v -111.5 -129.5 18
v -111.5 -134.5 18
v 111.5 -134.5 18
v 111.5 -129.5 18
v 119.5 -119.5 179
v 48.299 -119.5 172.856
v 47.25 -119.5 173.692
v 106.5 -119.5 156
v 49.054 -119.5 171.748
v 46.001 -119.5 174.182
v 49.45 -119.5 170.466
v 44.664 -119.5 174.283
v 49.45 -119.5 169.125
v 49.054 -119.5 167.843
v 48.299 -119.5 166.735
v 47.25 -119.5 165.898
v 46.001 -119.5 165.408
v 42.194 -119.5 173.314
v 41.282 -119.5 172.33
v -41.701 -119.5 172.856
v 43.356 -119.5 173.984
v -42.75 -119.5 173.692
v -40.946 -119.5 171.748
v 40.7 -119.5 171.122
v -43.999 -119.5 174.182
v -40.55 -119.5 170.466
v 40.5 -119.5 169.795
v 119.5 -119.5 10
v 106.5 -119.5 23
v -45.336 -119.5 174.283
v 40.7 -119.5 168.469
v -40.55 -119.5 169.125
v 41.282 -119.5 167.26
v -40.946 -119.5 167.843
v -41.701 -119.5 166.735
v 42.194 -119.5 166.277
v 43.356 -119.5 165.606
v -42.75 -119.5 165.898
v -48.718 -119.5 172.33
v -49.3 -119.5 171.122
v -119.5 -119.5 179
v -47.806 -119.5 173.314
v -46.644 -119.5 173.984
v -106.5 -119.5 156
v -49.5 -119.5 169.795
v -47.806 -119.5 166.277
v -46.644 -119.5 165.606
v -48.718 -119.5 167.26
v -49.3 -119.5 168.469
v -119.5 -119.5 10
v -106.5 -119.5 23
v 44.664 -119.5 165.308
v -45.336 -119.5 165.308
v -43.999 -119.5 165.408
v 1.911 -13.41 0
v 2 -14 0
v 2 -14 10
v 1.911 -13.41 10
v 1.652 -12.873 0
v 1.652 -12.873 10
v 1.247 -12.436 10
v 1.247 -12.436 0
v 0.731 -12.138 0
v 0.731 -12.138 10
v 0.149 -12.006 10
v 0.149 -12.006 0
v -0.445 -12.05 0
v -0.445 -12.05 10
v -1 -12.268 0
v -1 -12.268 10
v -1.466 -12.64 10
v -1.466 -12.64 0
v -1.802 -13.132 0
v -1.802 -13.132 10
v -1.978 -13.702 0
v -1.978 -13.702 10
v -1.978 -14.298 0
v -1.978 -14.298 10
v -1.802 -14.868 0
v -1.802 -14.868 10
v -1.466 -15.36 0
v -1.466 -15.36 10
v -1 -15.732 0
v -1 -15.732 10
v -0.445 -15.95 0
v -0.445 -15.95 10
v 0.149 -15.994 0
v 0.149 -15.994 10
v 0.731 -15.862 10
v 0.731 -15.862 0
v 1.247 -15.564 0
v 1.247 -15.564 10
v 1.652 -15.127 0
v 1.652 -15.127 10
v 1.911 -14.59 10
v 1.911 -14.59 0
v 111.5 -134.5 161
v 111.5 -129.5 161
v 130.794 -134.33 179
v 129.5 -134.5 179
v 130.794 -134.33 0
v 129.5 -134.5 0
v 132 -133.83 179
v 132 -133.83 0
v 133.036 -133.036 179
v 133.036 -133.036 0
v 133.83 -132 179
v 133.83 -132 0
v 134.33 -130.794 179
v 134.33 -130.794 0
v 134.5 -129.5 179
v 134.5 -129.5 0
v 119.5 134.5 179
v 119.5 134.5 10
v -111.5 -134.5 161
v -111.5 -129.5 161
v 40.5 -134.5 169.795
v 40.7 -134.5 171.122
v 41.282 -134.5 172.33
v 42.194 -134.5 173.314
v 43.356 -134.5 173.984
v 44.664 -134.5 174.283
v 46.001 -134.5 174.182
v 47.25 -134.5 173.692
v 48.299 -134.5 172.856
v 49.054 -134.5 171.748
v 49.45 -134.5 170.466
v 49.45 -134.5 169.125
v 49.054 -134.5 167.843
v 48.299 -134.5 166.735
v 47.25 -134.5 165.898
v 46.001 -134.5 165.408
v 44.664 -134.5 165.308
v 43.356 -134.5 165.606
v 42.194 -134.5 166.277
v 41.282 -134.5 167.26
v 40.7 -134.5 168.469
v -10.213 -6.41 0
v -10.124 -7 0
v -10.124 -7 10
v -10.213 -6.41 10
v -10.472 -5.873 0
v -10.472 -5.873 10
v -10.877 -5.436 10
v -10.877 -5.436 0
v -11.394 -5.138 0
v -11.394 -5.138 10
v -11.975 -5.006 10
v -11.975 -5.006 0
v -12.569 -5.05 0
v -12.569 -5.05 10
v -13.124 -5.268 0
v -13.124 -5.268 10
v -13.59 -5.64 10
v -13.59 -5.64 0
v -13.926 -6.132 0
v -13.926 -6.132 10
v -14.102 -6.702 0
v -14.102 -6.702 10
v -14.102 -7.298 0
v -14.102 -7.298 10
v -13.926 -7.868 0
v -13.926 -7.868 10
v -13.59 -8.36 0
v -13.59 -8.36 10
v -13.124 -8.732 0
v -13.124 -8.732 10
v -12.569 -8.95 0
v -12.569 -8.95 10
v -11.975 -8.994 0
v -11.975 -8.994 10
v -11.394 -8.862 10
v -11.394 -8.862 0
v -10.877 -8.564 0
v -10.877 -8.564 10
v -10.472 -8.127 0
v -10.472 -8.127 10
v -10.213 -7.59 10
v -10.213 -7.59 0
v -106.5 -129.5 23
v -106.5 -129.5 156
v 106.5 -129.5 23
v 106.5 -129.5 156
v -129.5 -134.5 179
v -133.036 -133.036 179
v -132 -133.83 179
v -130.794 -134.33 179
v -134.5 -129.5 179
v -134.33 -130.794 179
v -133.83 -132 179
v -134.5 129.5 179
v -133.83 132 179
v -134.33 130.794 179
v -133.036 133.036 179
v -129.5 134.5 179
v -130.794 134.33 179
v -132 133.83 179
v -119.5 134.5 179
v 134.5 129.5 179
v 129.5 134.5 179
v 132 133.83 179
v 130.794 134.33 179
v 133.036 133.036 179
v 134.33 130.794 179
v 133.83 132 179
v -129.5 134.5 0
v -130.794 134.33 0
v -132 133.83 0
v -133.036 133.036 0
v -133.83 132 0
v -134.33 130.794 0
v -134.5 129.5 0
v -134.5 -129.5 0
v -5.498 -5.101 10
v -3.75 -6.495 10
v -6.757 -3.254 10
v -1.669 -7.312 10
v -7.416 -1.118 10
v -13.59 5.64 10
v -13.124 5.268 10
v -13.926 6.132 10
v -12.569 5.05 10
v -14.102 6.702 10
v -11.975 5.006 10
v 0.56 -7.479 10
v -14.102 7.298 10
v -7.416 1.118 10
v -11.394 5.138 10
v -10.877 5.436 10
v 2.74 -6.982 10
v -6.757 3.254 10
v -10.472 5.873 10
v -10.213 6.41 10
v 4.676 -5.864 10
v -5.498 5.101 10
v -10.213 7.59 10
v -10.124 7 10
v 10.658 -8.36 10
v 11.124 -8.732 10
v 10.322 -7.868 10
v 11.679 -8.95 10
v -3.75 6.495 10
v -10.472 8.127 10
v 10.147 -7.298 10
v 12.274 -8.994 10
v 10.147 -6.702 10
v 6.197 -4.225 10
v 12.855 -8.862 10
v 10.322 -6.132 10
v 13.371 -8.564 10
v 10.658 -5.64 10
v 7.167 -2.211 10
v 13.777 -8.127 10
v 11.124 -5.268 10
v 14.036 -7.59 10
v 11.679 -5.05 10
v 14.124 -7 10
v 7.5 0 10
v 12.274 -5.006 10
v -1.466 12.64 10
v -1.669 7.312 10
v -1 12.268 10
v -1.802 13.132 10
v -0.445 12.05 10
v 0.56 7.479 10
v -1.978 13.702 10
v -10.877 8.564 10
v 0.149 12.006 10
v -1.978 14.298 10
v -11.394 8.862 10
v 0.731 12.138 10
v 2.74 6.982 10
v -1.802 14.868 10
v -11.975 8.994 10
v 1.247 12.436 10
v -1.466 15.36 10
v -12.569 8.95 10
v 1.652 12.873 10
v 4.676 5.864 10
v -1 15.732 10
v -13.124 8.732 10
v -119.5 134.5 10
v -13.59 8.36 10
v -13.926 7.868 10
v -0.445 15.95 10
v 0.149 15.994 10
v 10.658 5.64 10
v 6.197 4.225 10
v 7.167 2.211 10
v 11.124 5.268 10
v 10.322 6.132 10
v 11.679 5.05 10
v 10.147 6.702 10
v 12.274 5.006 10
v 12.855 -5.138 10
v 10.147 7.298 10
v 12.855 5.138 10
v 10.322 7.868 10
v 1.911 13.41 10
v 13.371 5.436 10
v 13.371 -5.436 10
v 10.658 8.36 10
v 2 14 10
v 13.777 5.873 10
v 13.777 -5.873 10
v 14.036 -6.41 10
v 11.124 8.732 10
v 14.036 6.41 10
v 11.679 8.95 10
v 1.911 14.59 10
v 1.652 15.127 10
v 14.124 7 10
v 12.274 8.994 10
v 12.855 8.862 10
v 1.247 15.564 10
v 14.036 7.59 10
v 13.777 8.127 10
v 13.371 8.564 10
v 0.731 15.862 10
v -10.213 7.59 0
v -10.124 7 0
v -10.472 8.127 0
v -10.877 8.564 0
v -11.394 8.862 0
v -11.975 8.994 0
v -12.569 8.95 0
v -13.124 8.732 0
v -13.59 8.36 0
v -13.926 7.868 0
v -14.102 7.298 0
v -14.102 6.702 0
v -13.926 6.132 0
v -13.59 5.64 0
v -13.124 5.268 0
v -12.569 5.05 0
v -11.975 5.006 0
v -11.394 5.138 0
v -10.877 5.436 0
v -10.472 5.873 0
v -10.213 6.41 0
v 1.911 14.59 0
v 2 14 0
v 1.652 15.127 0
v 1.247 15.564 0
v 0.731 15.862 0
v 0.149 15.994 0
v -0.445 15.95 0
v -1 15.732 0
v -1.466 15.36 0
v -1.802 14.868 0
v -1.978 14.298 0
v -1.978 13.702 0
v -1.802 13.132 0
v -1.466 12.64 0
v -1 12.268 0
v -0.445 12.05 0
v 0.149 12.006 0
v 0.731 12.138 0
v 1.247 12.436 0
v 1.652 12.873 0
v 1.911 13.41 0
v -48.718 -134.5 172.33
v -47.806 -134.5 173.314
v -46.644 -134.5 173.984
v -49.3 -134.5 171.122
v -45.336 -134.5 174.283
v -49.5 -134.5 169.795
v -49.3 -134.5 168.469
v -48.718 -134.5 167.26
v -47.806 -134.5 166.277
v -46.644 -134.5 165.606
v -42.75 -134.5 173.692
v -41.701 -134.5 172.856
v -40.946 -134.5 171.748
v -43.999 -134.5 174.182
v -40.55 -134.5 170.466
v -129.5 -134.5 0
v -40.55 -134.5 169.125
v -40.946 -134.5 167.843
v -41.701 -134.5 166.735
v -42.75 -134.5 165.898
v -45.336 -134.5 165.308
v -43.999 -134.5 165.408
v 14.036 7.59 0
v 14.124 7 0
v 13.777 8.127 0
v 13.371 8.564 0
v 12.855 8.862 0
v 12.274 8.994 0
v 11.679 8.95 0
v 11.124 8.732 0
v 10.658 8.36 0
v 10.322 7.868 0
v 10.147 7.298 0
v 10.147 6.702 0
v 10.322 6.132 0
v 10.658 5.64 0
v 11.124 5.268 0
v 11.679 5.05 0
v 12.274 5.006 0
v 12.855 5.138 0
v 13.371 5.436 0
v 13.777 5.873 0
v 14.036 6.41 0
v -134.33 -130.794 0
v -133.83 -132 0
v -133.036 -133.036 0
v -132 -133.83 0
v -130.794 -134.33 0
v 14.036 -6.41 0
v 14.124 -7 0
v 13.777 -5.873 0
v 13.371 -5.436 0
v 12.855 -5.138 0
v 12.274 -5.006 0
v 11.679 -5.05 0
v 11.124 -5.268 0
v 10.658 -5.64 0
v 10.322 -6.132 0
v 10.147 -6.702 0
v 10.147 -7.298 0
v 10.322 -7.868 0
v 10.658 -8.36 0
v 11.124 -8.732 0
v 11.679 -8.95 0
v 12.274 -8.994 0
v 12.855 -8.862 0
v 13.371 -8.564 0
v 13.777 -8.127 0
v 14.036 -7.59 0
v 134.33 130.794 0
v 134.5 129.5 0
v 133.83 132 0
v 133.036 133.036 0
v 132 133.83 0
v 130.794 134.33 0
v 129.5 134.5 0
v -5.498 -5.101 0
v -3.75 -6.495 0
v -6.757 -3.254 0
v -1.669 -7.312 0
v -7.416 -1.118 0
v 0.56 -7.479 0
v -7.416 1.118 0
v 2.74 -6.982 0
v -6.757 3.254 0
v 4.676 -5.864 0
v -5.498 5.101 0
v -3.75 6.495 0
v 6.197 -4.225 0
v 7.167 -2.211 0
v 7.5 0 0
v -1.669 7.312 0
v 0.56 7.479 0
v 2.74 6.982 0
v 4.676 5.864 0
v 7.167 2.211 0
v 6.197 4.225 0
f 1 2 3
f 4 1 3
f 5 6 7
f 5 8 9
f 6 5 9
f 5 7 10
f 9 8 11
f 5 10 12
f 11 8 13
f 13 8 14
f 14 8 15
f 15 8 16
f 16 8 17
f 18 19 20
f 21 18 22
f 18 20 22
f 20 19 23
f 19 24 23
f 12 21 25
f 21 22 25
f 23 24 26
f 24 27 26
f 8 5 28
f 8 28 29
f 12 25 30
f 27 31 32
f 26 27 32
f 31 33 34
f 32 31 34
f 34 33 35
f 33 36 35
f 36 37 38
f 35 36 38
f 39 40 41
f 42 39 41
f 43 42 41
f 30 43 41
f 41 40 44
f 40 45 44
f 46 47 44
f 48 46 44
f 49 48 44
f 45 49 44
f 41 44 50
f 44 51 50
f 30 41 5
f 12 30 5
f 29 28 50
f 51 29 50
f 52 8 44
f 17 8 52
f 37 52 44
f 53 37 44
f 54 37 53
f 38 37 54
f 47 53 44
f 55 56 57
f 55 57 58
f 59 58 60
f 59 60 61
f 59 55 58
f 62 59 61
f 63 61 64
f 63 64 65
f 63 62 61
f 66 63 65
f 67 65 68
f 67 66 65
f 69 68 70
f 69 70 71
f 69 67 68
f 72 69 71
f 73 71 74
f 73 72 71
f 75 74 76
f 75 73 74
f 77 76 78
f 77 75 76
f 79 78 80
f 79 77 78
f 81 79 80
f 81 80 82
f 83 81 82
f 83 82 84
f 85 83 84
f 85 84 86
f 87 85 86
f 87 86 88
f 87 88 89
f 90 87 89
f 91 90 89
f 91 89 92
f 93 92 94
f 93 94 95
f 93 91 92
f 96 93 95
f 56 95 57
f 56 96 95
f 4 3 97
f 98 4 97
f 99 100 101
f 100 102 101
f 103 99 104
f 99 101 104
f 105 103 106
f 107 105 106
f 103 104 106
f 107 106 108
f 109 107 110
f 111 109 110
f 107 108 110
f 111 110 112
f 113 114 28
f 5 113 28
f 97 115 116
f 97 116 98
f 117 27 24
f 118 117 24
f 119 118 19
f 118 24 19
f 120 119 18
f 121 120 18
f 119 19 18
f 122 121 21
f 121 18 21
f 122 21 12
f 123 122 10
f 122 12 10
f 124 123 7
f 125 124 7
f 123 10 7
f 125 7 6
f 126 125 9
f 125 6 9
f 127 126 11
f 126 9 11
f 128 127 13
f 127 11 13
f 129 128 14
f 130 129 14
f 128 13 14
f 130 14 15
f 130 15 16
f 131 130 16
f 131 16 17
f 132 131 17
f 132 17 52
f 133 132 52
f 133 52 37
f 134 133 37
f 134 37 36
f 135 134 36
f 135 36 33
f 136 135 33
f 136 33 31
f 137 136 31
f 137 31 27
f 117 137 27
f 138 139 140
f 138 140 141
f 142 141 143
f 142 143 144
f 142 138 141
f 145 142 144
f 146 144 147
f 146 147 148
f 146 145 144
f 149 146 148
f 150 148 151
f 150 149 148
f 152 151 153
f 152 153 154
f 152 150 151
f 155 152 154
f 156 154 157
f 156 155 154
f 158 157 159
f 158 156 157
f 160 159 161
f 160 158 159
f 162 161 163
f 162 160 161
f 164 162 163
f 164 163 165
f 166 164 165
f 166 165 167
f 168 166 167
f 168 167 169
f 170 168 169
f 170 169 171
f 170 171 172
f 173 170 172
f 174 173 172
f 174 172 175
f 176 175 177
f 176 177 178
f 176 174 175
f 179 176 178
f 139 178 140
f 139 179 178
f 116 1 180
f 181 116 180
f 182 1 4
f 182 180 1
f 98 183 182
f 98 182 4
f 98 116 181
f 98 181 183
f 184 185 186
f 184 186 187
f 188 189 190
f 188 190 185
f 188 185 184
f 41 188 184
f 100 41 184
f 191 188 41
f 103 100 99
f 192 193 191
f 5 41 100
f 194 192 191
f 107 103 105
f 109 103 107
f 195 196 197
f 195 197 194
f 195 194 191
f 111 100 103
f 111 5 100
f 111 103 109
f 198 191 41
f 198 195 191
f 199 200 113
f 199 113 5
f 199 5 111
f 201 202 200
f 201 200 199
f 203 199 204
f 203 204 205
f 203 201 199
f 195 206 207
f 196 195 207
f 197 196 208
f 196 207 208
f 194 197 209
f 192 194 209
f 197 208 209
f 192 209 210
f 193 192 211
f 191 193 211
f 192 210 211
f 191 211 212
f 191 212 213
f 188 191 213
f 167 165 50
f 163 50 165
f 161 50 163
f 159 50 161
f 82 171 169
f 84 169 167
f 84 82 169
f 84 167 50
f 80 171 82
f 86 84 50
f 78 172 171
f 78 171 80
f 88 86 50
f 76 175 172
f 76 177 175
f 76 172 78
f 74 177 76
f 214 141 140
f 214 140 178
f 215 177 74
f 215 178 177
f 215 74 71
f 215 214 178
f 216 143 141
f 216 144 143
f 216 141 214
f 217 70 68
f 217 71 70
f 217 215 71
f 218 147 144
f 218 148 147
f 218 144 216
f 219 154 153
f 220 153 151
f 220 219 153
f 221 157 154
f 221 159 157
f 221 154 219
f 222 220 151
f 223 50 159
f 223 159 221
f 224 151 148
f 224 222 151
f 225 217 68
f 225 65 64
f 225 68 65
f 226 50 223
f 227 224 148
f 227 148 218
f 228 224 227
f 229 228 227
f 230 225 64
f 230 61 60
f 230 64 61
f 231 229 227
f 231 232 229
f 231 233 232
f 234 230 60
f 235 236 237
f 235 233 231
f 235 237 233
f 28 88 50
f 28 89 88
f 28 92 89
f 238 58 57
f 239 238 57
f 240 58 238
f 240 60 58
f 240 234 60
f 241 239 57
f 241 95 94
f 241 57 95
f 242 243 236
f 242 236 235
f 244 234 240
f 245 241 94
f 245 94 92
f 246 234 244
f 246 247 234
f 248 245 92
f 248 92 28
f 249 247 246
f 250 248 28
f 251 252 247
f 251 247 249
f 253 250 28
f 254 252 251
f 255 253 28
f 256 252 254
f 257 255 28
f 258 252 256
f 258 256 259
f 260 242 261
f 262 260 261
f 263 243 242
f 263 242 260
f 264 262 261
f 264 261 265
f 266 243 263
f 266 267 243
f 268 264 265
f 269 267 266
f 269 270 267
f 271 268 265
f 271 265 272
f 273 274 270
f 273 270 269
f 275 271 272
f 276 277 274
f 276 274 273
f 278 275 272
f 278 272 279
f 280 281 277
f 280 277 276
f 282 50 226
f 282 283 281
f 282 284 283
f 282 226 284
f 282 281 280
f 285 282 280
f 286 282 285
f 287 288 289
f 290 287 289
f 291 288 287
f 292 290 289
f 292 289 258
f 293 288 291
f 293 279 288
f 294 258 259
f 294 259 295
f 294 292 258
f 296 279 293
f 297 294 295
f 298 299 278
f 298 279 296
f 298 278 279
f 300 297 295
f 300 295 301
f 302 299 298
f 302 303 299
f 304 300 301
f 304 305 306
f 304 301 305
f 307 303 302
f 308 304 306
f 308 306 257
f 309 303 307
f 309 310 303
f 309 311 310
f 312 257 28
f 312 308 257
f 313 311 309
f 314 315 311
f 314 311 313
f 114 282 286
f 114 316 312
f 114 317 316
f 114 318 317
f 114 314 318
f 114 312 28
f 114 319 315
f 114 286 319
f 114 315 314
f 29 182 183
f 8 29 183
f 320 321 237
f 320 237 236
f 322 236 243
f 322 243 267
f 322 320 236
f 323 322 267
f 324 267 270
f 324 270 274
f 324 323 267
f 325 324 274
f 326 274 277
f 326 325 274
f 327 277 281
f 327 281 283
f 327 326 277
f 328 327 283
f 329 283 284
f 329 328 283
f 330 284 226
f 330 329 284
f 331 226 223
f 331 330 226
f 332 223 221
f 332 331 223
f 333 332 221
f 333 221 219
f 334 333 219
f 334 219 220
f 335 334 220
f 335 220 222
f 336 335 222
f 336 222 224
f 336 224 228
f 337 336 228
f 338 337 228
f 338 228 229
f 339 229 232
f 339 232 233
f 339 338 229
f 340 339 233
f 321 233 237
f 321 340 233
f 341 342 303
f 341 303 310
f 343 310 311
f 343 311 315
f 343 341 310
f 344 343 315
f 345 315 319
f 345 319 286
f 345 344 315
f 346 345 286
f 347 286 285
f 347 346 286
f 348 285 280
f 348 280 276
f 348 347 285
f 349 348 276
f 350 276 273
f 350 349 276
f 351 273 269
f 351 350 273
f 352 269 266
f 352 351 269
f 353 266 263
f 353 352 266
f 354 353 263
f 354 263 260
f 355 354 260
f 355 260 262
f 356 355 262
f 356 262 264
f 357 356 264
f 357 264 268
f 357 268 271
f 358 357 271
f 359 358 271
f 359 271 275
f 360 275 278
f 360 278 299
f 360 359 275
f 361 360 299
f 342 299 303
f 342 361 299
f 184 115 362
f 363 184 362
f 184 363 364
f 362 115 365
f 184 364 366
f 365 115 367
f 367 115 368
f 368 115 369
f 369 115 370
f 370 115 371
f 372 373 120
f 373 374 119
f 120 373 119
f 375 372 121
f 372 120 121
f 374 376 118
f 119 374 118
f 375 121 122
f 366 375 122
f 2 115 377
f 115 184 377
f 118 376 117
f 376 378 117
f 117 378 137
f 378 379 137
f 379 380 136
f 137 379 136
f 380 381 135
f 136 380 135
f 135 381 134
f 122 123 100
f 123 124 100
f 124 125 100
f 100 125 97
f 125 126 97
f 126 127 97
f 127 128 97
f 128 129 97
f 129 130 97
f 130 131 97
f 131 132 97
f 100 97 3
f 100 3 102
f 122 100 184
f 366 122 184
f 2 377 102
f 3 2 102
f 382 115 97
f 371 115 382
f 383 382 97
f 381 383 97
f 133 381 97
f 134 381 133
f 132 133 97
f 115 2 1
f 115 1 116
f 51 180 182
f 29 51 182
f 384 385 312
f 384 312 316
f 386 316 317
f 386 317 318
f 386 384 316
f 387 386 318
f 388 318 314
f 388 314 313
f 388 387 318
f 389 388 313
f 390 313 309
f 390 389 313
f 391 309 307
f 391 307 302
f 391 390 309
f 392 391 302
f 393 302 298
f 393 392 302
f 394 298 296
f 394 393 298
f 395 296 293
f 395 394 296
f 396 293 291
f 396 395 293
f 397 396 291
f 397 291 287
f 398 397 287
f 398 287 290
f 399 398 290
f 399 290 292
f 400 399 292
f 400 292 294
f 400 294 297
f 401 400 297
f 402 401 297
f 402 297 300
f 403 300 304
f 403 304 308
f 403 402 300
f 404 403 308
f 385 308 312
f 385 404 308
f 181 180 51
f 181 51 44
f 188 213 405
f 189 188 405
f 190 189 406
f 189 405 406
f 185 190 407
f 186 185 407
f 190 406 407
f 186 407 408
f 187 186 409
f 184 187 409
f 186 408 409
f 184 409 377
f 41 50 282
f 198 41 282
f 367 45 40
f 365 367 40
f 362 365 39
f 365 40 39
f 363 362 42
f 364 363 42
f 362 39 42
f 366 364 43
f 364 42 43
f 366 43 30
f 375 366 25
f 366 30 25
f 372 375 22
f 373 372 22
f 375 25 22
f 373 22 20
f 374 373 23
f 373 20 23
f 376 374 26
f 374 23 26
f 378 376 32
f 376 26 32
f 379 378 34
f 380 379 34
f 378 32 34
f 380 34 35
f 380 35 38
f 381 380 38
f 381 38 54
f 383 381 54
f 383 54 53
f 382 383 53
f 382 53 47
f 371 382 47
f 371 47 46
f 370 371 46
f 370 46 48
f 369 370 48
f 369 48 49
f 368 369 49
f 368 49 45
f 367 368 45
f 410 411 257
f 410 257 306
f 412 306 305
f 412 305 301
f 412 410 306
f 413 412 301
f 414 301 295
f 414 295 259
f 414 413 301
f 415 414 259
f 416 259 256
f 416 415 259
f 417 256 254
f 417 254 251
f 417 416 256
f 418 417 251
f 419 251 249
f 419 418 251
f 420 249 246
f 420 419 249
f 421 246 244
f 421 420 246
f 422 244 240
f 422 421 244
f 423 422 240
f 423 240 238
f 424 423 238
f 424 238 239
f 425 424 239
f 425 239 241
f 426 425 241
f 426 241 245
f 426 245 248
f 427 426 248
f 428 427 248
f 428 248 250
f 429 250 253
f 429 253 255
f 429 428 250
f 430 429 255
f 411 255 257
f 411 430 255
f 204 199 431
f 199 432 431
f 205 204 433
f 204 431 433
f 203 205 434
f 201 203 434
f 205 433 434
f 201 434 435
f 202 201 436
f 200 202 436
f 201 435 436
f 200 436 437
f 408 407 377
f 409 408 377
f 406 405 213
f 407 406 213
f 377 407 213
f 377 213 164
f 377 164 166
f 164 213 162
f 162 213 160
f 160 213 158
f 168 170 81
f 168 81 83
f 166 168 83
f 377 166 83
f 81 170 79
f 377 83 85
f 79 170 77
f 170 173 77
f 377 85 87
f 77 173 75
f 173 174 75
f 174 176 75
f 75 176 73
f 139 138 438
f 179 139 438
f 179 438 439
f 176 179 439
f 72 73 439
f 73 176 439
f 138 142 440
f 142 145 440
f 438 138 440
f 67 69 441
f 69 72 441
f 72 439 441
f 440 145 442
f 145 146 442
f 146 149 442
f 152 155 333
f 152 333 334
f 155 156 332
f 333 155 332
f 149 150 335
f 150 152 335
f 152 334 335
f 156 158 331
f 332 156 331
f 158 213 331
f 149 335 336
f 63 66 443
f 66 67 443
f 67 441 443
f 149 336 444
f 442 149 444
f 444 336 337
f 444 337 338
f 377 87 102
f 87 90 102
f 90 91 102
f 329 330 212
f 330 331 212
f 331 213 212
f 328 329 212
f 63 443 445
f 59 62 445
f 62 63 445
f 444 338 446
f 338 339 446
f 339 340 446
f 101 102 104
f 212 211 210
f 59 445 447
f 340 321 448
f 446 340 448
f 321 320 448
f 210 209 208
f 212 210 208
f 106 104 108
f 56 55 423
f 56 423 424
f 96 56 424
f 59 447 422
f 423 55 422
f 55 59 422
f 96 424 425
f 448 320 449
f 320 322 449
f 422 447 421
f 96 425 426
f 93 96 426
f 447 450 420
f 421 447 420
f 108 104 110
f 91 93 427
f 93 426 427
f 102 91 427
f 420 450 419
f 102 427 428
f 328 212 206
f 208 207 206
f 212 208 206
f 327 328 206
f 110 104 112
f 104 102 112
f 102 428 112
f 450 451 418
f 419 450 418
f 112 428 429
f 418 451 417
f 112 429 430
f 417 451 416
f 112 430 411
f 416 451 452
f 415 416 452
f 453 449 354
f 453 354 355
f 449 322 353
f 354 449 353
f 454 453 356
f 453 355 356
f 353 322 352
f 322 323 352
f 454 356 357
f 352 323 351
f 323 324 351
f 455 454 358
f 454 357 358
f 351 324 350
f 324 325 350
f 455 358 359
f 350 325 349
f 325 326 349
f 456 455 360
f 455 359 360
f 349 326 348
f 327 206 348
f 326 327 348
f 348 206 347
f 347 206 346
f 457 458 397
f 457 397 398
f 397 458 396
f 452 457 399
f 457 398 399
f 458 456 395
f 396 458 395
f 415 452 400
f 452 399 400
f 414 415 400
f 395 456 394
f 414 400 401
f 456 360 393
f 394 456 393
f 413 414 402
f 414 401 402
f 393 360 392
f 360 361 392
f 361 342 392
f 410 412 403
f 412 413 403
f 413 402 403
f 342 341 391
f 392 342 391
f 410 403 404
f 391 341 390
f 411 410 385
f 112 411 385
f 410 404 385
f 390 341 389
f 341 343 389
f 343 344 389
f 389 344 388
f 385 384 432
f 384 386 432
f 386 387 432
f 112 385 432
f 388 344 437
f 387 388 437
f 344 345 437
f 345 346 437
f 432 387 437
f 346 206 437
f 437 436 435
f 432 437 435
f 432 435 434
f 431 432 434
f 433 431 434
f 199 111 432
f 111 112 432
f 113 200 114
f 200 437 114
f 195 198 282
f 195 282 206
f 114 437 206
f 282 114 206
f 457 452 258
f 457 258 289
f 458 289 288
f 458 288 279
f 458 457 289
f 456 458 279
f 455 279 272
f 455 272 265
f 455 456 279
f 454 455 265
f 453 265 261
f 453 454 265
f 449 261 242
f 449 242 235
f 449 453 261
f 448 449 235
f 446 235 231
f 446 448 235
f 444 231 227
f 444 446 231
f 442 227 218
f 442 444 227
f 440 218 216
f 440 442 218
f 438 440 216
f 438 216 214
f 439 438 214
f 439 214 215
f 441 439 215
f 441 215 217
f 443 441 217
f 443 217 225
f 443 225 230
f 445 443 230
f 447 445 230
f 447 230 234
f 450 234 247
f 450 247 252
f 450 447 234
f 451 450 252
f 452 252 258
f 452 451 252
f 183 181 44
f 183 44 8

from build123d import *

# Parameters (mm, degrees)
F0_R     = 2
F0_R_2   = 7.5
F1_DEPTH = 10
F3_DEPTH = 169
F4_W     = 223
F4_H     = 143
F4_W_2   = 212.9999995232
F4_H_2   = 132.9999995232
F5_DEPTH = 5
F6_DEPTH = 25
F7_R     = 4.5
F8_DEPTH = 25


with BuildPart() as f1:
    # F0 (on Top) → F1 (new body)
    with BuildSketch(Plane.XY):
        with BuildLine():
            Line((129.5, 134.5), (-129.5, 134.5))
            ThreePointArc((-129.5, 134.5), (-133.0355339059, 133.0355339059), (-134.5, 129.5))
            Line((-134.5, 129.5), (-134.5, -129.5))
            ThreePointArc((-134.5, -129.5), (-133.0355339059, -133.0355339059), (-129.5, -134.5))
            Line((-129.5, -134.5), (129.5, -134.5))
            ThreePointArc((129.5, -134.5), (133.0355339059, -133.0355339059), (134.5, -129.5))
            Line((134.5, -129.5), (134.5, 129.5))
            ThreePointArc((134.5, 129.5), (133.0355339059, 133.0355339059), (129.5, 134.5))
        make_face()
        with Locations((-12.124355653, -7)):
            Circle(F0_R, mode=Mode.SUBTRACT)
        with Locations((0, -14)):
            Circle(F0_R, mode=Mode.SUBTRACT)
        with Locations((12.124355653, -7)):
            Circle(F0_R, mode=Mode.SUBTRACT)
        with Locations((-12.124355653, 7)):
            Circle(F0_R, mode=Mode.SUBTRACT)
        Circle(F0_R_2, mode=Mode.SUBTRACT)
        with Locations((12.124355653, 7)):
            Circle(F0_R, mode=Mode.SUBTRACT)
        with Locations((0, 14)):
            Circle(F0_R, mode=Mode.SUBTRACT)
    extrude(amount=F1_DEPTH)

    # F2 (on face) → F3 (join)
    with BuildSketch(Plane.XY.offset(10)):
        with BuildLine():
            ThreePointArc((-134.5, -129.5), (-133.0355339059, -133.0355339059), (-129.5, -134.5))
            Line((-129.5, -134.5), (129.5, -134.5))
            ThreePointArc((129.5, -134.5), (133.0355339059, -133.0355339059), (134.5, -129.5))
            Line((134.5, -129.5), (134.5, -119.5))
            Line((134.5, -119.5), (134.5, 129.5))
            ThreePointArc((134.5, 129.5), (133.0355339059, 133.0355339059), (129.5, 134.5))
            Line((129.5, 134.5), (119.5, 134.5))
            Line((119.5, 134.5), (119.5, -119.5))
            Line((119.5, -119.5), (-119.5, -119.5))
            Line((-119.5, -119.5), (-119.5, 134.5))
            Line((-119.5, 134.5), (-129.5, 134.5))
            ThreePointArc((-129.5, 134.5), (-133.0355339059, 133.0355339059), (-134.5, 129.5))
            Line((-134.5, 129.5), (-134.5, -119.5))
            Line((-134.5, -119.5), (-134.5, -129.5))
        make_face()
    extrude(amount=F3_DEPTH)

    # F4 (on face) → F5 (cut)
    with BuildSketch(Plane.XZ.offset(134.5)):
        with Locations((0, 89.5)):
            Rectangle(F4_W, F4_H)
        with Locations((0, 89.5)):
            Rectangle(F4_W_2, F4_H_2, mode=Mode.SUBTRACT)
    extrude(amount=-F5_DEPTH, mode=Mode.SUBTRACT)

    # F6 (cut): a face of the model
    f6_faces = [f1.faces().sort_by_distance(p)[0] for p in [
        (0, -134.5, 89.5),
    ]]
    extrude(f6_faces, amount=-F6_DEPTH, mode=Mode.SUBTRACT)

    # F7 (on face) → F8 (cut)
    with BuildSketch(Plane(origin=(0, -119.5, 0), x_dir=(-1, 0, 0), z_dir=(0, 1, 0))):
        with Locations((-45, 169.7952974686)):
            Circle(F7_R)
        with Locations((45, 169.7952974686)):
            Circle(F7_R)
    extrude(amount=-F8_DEPTH, mode=Mode.SUBTRACT)


solid = f1.part
